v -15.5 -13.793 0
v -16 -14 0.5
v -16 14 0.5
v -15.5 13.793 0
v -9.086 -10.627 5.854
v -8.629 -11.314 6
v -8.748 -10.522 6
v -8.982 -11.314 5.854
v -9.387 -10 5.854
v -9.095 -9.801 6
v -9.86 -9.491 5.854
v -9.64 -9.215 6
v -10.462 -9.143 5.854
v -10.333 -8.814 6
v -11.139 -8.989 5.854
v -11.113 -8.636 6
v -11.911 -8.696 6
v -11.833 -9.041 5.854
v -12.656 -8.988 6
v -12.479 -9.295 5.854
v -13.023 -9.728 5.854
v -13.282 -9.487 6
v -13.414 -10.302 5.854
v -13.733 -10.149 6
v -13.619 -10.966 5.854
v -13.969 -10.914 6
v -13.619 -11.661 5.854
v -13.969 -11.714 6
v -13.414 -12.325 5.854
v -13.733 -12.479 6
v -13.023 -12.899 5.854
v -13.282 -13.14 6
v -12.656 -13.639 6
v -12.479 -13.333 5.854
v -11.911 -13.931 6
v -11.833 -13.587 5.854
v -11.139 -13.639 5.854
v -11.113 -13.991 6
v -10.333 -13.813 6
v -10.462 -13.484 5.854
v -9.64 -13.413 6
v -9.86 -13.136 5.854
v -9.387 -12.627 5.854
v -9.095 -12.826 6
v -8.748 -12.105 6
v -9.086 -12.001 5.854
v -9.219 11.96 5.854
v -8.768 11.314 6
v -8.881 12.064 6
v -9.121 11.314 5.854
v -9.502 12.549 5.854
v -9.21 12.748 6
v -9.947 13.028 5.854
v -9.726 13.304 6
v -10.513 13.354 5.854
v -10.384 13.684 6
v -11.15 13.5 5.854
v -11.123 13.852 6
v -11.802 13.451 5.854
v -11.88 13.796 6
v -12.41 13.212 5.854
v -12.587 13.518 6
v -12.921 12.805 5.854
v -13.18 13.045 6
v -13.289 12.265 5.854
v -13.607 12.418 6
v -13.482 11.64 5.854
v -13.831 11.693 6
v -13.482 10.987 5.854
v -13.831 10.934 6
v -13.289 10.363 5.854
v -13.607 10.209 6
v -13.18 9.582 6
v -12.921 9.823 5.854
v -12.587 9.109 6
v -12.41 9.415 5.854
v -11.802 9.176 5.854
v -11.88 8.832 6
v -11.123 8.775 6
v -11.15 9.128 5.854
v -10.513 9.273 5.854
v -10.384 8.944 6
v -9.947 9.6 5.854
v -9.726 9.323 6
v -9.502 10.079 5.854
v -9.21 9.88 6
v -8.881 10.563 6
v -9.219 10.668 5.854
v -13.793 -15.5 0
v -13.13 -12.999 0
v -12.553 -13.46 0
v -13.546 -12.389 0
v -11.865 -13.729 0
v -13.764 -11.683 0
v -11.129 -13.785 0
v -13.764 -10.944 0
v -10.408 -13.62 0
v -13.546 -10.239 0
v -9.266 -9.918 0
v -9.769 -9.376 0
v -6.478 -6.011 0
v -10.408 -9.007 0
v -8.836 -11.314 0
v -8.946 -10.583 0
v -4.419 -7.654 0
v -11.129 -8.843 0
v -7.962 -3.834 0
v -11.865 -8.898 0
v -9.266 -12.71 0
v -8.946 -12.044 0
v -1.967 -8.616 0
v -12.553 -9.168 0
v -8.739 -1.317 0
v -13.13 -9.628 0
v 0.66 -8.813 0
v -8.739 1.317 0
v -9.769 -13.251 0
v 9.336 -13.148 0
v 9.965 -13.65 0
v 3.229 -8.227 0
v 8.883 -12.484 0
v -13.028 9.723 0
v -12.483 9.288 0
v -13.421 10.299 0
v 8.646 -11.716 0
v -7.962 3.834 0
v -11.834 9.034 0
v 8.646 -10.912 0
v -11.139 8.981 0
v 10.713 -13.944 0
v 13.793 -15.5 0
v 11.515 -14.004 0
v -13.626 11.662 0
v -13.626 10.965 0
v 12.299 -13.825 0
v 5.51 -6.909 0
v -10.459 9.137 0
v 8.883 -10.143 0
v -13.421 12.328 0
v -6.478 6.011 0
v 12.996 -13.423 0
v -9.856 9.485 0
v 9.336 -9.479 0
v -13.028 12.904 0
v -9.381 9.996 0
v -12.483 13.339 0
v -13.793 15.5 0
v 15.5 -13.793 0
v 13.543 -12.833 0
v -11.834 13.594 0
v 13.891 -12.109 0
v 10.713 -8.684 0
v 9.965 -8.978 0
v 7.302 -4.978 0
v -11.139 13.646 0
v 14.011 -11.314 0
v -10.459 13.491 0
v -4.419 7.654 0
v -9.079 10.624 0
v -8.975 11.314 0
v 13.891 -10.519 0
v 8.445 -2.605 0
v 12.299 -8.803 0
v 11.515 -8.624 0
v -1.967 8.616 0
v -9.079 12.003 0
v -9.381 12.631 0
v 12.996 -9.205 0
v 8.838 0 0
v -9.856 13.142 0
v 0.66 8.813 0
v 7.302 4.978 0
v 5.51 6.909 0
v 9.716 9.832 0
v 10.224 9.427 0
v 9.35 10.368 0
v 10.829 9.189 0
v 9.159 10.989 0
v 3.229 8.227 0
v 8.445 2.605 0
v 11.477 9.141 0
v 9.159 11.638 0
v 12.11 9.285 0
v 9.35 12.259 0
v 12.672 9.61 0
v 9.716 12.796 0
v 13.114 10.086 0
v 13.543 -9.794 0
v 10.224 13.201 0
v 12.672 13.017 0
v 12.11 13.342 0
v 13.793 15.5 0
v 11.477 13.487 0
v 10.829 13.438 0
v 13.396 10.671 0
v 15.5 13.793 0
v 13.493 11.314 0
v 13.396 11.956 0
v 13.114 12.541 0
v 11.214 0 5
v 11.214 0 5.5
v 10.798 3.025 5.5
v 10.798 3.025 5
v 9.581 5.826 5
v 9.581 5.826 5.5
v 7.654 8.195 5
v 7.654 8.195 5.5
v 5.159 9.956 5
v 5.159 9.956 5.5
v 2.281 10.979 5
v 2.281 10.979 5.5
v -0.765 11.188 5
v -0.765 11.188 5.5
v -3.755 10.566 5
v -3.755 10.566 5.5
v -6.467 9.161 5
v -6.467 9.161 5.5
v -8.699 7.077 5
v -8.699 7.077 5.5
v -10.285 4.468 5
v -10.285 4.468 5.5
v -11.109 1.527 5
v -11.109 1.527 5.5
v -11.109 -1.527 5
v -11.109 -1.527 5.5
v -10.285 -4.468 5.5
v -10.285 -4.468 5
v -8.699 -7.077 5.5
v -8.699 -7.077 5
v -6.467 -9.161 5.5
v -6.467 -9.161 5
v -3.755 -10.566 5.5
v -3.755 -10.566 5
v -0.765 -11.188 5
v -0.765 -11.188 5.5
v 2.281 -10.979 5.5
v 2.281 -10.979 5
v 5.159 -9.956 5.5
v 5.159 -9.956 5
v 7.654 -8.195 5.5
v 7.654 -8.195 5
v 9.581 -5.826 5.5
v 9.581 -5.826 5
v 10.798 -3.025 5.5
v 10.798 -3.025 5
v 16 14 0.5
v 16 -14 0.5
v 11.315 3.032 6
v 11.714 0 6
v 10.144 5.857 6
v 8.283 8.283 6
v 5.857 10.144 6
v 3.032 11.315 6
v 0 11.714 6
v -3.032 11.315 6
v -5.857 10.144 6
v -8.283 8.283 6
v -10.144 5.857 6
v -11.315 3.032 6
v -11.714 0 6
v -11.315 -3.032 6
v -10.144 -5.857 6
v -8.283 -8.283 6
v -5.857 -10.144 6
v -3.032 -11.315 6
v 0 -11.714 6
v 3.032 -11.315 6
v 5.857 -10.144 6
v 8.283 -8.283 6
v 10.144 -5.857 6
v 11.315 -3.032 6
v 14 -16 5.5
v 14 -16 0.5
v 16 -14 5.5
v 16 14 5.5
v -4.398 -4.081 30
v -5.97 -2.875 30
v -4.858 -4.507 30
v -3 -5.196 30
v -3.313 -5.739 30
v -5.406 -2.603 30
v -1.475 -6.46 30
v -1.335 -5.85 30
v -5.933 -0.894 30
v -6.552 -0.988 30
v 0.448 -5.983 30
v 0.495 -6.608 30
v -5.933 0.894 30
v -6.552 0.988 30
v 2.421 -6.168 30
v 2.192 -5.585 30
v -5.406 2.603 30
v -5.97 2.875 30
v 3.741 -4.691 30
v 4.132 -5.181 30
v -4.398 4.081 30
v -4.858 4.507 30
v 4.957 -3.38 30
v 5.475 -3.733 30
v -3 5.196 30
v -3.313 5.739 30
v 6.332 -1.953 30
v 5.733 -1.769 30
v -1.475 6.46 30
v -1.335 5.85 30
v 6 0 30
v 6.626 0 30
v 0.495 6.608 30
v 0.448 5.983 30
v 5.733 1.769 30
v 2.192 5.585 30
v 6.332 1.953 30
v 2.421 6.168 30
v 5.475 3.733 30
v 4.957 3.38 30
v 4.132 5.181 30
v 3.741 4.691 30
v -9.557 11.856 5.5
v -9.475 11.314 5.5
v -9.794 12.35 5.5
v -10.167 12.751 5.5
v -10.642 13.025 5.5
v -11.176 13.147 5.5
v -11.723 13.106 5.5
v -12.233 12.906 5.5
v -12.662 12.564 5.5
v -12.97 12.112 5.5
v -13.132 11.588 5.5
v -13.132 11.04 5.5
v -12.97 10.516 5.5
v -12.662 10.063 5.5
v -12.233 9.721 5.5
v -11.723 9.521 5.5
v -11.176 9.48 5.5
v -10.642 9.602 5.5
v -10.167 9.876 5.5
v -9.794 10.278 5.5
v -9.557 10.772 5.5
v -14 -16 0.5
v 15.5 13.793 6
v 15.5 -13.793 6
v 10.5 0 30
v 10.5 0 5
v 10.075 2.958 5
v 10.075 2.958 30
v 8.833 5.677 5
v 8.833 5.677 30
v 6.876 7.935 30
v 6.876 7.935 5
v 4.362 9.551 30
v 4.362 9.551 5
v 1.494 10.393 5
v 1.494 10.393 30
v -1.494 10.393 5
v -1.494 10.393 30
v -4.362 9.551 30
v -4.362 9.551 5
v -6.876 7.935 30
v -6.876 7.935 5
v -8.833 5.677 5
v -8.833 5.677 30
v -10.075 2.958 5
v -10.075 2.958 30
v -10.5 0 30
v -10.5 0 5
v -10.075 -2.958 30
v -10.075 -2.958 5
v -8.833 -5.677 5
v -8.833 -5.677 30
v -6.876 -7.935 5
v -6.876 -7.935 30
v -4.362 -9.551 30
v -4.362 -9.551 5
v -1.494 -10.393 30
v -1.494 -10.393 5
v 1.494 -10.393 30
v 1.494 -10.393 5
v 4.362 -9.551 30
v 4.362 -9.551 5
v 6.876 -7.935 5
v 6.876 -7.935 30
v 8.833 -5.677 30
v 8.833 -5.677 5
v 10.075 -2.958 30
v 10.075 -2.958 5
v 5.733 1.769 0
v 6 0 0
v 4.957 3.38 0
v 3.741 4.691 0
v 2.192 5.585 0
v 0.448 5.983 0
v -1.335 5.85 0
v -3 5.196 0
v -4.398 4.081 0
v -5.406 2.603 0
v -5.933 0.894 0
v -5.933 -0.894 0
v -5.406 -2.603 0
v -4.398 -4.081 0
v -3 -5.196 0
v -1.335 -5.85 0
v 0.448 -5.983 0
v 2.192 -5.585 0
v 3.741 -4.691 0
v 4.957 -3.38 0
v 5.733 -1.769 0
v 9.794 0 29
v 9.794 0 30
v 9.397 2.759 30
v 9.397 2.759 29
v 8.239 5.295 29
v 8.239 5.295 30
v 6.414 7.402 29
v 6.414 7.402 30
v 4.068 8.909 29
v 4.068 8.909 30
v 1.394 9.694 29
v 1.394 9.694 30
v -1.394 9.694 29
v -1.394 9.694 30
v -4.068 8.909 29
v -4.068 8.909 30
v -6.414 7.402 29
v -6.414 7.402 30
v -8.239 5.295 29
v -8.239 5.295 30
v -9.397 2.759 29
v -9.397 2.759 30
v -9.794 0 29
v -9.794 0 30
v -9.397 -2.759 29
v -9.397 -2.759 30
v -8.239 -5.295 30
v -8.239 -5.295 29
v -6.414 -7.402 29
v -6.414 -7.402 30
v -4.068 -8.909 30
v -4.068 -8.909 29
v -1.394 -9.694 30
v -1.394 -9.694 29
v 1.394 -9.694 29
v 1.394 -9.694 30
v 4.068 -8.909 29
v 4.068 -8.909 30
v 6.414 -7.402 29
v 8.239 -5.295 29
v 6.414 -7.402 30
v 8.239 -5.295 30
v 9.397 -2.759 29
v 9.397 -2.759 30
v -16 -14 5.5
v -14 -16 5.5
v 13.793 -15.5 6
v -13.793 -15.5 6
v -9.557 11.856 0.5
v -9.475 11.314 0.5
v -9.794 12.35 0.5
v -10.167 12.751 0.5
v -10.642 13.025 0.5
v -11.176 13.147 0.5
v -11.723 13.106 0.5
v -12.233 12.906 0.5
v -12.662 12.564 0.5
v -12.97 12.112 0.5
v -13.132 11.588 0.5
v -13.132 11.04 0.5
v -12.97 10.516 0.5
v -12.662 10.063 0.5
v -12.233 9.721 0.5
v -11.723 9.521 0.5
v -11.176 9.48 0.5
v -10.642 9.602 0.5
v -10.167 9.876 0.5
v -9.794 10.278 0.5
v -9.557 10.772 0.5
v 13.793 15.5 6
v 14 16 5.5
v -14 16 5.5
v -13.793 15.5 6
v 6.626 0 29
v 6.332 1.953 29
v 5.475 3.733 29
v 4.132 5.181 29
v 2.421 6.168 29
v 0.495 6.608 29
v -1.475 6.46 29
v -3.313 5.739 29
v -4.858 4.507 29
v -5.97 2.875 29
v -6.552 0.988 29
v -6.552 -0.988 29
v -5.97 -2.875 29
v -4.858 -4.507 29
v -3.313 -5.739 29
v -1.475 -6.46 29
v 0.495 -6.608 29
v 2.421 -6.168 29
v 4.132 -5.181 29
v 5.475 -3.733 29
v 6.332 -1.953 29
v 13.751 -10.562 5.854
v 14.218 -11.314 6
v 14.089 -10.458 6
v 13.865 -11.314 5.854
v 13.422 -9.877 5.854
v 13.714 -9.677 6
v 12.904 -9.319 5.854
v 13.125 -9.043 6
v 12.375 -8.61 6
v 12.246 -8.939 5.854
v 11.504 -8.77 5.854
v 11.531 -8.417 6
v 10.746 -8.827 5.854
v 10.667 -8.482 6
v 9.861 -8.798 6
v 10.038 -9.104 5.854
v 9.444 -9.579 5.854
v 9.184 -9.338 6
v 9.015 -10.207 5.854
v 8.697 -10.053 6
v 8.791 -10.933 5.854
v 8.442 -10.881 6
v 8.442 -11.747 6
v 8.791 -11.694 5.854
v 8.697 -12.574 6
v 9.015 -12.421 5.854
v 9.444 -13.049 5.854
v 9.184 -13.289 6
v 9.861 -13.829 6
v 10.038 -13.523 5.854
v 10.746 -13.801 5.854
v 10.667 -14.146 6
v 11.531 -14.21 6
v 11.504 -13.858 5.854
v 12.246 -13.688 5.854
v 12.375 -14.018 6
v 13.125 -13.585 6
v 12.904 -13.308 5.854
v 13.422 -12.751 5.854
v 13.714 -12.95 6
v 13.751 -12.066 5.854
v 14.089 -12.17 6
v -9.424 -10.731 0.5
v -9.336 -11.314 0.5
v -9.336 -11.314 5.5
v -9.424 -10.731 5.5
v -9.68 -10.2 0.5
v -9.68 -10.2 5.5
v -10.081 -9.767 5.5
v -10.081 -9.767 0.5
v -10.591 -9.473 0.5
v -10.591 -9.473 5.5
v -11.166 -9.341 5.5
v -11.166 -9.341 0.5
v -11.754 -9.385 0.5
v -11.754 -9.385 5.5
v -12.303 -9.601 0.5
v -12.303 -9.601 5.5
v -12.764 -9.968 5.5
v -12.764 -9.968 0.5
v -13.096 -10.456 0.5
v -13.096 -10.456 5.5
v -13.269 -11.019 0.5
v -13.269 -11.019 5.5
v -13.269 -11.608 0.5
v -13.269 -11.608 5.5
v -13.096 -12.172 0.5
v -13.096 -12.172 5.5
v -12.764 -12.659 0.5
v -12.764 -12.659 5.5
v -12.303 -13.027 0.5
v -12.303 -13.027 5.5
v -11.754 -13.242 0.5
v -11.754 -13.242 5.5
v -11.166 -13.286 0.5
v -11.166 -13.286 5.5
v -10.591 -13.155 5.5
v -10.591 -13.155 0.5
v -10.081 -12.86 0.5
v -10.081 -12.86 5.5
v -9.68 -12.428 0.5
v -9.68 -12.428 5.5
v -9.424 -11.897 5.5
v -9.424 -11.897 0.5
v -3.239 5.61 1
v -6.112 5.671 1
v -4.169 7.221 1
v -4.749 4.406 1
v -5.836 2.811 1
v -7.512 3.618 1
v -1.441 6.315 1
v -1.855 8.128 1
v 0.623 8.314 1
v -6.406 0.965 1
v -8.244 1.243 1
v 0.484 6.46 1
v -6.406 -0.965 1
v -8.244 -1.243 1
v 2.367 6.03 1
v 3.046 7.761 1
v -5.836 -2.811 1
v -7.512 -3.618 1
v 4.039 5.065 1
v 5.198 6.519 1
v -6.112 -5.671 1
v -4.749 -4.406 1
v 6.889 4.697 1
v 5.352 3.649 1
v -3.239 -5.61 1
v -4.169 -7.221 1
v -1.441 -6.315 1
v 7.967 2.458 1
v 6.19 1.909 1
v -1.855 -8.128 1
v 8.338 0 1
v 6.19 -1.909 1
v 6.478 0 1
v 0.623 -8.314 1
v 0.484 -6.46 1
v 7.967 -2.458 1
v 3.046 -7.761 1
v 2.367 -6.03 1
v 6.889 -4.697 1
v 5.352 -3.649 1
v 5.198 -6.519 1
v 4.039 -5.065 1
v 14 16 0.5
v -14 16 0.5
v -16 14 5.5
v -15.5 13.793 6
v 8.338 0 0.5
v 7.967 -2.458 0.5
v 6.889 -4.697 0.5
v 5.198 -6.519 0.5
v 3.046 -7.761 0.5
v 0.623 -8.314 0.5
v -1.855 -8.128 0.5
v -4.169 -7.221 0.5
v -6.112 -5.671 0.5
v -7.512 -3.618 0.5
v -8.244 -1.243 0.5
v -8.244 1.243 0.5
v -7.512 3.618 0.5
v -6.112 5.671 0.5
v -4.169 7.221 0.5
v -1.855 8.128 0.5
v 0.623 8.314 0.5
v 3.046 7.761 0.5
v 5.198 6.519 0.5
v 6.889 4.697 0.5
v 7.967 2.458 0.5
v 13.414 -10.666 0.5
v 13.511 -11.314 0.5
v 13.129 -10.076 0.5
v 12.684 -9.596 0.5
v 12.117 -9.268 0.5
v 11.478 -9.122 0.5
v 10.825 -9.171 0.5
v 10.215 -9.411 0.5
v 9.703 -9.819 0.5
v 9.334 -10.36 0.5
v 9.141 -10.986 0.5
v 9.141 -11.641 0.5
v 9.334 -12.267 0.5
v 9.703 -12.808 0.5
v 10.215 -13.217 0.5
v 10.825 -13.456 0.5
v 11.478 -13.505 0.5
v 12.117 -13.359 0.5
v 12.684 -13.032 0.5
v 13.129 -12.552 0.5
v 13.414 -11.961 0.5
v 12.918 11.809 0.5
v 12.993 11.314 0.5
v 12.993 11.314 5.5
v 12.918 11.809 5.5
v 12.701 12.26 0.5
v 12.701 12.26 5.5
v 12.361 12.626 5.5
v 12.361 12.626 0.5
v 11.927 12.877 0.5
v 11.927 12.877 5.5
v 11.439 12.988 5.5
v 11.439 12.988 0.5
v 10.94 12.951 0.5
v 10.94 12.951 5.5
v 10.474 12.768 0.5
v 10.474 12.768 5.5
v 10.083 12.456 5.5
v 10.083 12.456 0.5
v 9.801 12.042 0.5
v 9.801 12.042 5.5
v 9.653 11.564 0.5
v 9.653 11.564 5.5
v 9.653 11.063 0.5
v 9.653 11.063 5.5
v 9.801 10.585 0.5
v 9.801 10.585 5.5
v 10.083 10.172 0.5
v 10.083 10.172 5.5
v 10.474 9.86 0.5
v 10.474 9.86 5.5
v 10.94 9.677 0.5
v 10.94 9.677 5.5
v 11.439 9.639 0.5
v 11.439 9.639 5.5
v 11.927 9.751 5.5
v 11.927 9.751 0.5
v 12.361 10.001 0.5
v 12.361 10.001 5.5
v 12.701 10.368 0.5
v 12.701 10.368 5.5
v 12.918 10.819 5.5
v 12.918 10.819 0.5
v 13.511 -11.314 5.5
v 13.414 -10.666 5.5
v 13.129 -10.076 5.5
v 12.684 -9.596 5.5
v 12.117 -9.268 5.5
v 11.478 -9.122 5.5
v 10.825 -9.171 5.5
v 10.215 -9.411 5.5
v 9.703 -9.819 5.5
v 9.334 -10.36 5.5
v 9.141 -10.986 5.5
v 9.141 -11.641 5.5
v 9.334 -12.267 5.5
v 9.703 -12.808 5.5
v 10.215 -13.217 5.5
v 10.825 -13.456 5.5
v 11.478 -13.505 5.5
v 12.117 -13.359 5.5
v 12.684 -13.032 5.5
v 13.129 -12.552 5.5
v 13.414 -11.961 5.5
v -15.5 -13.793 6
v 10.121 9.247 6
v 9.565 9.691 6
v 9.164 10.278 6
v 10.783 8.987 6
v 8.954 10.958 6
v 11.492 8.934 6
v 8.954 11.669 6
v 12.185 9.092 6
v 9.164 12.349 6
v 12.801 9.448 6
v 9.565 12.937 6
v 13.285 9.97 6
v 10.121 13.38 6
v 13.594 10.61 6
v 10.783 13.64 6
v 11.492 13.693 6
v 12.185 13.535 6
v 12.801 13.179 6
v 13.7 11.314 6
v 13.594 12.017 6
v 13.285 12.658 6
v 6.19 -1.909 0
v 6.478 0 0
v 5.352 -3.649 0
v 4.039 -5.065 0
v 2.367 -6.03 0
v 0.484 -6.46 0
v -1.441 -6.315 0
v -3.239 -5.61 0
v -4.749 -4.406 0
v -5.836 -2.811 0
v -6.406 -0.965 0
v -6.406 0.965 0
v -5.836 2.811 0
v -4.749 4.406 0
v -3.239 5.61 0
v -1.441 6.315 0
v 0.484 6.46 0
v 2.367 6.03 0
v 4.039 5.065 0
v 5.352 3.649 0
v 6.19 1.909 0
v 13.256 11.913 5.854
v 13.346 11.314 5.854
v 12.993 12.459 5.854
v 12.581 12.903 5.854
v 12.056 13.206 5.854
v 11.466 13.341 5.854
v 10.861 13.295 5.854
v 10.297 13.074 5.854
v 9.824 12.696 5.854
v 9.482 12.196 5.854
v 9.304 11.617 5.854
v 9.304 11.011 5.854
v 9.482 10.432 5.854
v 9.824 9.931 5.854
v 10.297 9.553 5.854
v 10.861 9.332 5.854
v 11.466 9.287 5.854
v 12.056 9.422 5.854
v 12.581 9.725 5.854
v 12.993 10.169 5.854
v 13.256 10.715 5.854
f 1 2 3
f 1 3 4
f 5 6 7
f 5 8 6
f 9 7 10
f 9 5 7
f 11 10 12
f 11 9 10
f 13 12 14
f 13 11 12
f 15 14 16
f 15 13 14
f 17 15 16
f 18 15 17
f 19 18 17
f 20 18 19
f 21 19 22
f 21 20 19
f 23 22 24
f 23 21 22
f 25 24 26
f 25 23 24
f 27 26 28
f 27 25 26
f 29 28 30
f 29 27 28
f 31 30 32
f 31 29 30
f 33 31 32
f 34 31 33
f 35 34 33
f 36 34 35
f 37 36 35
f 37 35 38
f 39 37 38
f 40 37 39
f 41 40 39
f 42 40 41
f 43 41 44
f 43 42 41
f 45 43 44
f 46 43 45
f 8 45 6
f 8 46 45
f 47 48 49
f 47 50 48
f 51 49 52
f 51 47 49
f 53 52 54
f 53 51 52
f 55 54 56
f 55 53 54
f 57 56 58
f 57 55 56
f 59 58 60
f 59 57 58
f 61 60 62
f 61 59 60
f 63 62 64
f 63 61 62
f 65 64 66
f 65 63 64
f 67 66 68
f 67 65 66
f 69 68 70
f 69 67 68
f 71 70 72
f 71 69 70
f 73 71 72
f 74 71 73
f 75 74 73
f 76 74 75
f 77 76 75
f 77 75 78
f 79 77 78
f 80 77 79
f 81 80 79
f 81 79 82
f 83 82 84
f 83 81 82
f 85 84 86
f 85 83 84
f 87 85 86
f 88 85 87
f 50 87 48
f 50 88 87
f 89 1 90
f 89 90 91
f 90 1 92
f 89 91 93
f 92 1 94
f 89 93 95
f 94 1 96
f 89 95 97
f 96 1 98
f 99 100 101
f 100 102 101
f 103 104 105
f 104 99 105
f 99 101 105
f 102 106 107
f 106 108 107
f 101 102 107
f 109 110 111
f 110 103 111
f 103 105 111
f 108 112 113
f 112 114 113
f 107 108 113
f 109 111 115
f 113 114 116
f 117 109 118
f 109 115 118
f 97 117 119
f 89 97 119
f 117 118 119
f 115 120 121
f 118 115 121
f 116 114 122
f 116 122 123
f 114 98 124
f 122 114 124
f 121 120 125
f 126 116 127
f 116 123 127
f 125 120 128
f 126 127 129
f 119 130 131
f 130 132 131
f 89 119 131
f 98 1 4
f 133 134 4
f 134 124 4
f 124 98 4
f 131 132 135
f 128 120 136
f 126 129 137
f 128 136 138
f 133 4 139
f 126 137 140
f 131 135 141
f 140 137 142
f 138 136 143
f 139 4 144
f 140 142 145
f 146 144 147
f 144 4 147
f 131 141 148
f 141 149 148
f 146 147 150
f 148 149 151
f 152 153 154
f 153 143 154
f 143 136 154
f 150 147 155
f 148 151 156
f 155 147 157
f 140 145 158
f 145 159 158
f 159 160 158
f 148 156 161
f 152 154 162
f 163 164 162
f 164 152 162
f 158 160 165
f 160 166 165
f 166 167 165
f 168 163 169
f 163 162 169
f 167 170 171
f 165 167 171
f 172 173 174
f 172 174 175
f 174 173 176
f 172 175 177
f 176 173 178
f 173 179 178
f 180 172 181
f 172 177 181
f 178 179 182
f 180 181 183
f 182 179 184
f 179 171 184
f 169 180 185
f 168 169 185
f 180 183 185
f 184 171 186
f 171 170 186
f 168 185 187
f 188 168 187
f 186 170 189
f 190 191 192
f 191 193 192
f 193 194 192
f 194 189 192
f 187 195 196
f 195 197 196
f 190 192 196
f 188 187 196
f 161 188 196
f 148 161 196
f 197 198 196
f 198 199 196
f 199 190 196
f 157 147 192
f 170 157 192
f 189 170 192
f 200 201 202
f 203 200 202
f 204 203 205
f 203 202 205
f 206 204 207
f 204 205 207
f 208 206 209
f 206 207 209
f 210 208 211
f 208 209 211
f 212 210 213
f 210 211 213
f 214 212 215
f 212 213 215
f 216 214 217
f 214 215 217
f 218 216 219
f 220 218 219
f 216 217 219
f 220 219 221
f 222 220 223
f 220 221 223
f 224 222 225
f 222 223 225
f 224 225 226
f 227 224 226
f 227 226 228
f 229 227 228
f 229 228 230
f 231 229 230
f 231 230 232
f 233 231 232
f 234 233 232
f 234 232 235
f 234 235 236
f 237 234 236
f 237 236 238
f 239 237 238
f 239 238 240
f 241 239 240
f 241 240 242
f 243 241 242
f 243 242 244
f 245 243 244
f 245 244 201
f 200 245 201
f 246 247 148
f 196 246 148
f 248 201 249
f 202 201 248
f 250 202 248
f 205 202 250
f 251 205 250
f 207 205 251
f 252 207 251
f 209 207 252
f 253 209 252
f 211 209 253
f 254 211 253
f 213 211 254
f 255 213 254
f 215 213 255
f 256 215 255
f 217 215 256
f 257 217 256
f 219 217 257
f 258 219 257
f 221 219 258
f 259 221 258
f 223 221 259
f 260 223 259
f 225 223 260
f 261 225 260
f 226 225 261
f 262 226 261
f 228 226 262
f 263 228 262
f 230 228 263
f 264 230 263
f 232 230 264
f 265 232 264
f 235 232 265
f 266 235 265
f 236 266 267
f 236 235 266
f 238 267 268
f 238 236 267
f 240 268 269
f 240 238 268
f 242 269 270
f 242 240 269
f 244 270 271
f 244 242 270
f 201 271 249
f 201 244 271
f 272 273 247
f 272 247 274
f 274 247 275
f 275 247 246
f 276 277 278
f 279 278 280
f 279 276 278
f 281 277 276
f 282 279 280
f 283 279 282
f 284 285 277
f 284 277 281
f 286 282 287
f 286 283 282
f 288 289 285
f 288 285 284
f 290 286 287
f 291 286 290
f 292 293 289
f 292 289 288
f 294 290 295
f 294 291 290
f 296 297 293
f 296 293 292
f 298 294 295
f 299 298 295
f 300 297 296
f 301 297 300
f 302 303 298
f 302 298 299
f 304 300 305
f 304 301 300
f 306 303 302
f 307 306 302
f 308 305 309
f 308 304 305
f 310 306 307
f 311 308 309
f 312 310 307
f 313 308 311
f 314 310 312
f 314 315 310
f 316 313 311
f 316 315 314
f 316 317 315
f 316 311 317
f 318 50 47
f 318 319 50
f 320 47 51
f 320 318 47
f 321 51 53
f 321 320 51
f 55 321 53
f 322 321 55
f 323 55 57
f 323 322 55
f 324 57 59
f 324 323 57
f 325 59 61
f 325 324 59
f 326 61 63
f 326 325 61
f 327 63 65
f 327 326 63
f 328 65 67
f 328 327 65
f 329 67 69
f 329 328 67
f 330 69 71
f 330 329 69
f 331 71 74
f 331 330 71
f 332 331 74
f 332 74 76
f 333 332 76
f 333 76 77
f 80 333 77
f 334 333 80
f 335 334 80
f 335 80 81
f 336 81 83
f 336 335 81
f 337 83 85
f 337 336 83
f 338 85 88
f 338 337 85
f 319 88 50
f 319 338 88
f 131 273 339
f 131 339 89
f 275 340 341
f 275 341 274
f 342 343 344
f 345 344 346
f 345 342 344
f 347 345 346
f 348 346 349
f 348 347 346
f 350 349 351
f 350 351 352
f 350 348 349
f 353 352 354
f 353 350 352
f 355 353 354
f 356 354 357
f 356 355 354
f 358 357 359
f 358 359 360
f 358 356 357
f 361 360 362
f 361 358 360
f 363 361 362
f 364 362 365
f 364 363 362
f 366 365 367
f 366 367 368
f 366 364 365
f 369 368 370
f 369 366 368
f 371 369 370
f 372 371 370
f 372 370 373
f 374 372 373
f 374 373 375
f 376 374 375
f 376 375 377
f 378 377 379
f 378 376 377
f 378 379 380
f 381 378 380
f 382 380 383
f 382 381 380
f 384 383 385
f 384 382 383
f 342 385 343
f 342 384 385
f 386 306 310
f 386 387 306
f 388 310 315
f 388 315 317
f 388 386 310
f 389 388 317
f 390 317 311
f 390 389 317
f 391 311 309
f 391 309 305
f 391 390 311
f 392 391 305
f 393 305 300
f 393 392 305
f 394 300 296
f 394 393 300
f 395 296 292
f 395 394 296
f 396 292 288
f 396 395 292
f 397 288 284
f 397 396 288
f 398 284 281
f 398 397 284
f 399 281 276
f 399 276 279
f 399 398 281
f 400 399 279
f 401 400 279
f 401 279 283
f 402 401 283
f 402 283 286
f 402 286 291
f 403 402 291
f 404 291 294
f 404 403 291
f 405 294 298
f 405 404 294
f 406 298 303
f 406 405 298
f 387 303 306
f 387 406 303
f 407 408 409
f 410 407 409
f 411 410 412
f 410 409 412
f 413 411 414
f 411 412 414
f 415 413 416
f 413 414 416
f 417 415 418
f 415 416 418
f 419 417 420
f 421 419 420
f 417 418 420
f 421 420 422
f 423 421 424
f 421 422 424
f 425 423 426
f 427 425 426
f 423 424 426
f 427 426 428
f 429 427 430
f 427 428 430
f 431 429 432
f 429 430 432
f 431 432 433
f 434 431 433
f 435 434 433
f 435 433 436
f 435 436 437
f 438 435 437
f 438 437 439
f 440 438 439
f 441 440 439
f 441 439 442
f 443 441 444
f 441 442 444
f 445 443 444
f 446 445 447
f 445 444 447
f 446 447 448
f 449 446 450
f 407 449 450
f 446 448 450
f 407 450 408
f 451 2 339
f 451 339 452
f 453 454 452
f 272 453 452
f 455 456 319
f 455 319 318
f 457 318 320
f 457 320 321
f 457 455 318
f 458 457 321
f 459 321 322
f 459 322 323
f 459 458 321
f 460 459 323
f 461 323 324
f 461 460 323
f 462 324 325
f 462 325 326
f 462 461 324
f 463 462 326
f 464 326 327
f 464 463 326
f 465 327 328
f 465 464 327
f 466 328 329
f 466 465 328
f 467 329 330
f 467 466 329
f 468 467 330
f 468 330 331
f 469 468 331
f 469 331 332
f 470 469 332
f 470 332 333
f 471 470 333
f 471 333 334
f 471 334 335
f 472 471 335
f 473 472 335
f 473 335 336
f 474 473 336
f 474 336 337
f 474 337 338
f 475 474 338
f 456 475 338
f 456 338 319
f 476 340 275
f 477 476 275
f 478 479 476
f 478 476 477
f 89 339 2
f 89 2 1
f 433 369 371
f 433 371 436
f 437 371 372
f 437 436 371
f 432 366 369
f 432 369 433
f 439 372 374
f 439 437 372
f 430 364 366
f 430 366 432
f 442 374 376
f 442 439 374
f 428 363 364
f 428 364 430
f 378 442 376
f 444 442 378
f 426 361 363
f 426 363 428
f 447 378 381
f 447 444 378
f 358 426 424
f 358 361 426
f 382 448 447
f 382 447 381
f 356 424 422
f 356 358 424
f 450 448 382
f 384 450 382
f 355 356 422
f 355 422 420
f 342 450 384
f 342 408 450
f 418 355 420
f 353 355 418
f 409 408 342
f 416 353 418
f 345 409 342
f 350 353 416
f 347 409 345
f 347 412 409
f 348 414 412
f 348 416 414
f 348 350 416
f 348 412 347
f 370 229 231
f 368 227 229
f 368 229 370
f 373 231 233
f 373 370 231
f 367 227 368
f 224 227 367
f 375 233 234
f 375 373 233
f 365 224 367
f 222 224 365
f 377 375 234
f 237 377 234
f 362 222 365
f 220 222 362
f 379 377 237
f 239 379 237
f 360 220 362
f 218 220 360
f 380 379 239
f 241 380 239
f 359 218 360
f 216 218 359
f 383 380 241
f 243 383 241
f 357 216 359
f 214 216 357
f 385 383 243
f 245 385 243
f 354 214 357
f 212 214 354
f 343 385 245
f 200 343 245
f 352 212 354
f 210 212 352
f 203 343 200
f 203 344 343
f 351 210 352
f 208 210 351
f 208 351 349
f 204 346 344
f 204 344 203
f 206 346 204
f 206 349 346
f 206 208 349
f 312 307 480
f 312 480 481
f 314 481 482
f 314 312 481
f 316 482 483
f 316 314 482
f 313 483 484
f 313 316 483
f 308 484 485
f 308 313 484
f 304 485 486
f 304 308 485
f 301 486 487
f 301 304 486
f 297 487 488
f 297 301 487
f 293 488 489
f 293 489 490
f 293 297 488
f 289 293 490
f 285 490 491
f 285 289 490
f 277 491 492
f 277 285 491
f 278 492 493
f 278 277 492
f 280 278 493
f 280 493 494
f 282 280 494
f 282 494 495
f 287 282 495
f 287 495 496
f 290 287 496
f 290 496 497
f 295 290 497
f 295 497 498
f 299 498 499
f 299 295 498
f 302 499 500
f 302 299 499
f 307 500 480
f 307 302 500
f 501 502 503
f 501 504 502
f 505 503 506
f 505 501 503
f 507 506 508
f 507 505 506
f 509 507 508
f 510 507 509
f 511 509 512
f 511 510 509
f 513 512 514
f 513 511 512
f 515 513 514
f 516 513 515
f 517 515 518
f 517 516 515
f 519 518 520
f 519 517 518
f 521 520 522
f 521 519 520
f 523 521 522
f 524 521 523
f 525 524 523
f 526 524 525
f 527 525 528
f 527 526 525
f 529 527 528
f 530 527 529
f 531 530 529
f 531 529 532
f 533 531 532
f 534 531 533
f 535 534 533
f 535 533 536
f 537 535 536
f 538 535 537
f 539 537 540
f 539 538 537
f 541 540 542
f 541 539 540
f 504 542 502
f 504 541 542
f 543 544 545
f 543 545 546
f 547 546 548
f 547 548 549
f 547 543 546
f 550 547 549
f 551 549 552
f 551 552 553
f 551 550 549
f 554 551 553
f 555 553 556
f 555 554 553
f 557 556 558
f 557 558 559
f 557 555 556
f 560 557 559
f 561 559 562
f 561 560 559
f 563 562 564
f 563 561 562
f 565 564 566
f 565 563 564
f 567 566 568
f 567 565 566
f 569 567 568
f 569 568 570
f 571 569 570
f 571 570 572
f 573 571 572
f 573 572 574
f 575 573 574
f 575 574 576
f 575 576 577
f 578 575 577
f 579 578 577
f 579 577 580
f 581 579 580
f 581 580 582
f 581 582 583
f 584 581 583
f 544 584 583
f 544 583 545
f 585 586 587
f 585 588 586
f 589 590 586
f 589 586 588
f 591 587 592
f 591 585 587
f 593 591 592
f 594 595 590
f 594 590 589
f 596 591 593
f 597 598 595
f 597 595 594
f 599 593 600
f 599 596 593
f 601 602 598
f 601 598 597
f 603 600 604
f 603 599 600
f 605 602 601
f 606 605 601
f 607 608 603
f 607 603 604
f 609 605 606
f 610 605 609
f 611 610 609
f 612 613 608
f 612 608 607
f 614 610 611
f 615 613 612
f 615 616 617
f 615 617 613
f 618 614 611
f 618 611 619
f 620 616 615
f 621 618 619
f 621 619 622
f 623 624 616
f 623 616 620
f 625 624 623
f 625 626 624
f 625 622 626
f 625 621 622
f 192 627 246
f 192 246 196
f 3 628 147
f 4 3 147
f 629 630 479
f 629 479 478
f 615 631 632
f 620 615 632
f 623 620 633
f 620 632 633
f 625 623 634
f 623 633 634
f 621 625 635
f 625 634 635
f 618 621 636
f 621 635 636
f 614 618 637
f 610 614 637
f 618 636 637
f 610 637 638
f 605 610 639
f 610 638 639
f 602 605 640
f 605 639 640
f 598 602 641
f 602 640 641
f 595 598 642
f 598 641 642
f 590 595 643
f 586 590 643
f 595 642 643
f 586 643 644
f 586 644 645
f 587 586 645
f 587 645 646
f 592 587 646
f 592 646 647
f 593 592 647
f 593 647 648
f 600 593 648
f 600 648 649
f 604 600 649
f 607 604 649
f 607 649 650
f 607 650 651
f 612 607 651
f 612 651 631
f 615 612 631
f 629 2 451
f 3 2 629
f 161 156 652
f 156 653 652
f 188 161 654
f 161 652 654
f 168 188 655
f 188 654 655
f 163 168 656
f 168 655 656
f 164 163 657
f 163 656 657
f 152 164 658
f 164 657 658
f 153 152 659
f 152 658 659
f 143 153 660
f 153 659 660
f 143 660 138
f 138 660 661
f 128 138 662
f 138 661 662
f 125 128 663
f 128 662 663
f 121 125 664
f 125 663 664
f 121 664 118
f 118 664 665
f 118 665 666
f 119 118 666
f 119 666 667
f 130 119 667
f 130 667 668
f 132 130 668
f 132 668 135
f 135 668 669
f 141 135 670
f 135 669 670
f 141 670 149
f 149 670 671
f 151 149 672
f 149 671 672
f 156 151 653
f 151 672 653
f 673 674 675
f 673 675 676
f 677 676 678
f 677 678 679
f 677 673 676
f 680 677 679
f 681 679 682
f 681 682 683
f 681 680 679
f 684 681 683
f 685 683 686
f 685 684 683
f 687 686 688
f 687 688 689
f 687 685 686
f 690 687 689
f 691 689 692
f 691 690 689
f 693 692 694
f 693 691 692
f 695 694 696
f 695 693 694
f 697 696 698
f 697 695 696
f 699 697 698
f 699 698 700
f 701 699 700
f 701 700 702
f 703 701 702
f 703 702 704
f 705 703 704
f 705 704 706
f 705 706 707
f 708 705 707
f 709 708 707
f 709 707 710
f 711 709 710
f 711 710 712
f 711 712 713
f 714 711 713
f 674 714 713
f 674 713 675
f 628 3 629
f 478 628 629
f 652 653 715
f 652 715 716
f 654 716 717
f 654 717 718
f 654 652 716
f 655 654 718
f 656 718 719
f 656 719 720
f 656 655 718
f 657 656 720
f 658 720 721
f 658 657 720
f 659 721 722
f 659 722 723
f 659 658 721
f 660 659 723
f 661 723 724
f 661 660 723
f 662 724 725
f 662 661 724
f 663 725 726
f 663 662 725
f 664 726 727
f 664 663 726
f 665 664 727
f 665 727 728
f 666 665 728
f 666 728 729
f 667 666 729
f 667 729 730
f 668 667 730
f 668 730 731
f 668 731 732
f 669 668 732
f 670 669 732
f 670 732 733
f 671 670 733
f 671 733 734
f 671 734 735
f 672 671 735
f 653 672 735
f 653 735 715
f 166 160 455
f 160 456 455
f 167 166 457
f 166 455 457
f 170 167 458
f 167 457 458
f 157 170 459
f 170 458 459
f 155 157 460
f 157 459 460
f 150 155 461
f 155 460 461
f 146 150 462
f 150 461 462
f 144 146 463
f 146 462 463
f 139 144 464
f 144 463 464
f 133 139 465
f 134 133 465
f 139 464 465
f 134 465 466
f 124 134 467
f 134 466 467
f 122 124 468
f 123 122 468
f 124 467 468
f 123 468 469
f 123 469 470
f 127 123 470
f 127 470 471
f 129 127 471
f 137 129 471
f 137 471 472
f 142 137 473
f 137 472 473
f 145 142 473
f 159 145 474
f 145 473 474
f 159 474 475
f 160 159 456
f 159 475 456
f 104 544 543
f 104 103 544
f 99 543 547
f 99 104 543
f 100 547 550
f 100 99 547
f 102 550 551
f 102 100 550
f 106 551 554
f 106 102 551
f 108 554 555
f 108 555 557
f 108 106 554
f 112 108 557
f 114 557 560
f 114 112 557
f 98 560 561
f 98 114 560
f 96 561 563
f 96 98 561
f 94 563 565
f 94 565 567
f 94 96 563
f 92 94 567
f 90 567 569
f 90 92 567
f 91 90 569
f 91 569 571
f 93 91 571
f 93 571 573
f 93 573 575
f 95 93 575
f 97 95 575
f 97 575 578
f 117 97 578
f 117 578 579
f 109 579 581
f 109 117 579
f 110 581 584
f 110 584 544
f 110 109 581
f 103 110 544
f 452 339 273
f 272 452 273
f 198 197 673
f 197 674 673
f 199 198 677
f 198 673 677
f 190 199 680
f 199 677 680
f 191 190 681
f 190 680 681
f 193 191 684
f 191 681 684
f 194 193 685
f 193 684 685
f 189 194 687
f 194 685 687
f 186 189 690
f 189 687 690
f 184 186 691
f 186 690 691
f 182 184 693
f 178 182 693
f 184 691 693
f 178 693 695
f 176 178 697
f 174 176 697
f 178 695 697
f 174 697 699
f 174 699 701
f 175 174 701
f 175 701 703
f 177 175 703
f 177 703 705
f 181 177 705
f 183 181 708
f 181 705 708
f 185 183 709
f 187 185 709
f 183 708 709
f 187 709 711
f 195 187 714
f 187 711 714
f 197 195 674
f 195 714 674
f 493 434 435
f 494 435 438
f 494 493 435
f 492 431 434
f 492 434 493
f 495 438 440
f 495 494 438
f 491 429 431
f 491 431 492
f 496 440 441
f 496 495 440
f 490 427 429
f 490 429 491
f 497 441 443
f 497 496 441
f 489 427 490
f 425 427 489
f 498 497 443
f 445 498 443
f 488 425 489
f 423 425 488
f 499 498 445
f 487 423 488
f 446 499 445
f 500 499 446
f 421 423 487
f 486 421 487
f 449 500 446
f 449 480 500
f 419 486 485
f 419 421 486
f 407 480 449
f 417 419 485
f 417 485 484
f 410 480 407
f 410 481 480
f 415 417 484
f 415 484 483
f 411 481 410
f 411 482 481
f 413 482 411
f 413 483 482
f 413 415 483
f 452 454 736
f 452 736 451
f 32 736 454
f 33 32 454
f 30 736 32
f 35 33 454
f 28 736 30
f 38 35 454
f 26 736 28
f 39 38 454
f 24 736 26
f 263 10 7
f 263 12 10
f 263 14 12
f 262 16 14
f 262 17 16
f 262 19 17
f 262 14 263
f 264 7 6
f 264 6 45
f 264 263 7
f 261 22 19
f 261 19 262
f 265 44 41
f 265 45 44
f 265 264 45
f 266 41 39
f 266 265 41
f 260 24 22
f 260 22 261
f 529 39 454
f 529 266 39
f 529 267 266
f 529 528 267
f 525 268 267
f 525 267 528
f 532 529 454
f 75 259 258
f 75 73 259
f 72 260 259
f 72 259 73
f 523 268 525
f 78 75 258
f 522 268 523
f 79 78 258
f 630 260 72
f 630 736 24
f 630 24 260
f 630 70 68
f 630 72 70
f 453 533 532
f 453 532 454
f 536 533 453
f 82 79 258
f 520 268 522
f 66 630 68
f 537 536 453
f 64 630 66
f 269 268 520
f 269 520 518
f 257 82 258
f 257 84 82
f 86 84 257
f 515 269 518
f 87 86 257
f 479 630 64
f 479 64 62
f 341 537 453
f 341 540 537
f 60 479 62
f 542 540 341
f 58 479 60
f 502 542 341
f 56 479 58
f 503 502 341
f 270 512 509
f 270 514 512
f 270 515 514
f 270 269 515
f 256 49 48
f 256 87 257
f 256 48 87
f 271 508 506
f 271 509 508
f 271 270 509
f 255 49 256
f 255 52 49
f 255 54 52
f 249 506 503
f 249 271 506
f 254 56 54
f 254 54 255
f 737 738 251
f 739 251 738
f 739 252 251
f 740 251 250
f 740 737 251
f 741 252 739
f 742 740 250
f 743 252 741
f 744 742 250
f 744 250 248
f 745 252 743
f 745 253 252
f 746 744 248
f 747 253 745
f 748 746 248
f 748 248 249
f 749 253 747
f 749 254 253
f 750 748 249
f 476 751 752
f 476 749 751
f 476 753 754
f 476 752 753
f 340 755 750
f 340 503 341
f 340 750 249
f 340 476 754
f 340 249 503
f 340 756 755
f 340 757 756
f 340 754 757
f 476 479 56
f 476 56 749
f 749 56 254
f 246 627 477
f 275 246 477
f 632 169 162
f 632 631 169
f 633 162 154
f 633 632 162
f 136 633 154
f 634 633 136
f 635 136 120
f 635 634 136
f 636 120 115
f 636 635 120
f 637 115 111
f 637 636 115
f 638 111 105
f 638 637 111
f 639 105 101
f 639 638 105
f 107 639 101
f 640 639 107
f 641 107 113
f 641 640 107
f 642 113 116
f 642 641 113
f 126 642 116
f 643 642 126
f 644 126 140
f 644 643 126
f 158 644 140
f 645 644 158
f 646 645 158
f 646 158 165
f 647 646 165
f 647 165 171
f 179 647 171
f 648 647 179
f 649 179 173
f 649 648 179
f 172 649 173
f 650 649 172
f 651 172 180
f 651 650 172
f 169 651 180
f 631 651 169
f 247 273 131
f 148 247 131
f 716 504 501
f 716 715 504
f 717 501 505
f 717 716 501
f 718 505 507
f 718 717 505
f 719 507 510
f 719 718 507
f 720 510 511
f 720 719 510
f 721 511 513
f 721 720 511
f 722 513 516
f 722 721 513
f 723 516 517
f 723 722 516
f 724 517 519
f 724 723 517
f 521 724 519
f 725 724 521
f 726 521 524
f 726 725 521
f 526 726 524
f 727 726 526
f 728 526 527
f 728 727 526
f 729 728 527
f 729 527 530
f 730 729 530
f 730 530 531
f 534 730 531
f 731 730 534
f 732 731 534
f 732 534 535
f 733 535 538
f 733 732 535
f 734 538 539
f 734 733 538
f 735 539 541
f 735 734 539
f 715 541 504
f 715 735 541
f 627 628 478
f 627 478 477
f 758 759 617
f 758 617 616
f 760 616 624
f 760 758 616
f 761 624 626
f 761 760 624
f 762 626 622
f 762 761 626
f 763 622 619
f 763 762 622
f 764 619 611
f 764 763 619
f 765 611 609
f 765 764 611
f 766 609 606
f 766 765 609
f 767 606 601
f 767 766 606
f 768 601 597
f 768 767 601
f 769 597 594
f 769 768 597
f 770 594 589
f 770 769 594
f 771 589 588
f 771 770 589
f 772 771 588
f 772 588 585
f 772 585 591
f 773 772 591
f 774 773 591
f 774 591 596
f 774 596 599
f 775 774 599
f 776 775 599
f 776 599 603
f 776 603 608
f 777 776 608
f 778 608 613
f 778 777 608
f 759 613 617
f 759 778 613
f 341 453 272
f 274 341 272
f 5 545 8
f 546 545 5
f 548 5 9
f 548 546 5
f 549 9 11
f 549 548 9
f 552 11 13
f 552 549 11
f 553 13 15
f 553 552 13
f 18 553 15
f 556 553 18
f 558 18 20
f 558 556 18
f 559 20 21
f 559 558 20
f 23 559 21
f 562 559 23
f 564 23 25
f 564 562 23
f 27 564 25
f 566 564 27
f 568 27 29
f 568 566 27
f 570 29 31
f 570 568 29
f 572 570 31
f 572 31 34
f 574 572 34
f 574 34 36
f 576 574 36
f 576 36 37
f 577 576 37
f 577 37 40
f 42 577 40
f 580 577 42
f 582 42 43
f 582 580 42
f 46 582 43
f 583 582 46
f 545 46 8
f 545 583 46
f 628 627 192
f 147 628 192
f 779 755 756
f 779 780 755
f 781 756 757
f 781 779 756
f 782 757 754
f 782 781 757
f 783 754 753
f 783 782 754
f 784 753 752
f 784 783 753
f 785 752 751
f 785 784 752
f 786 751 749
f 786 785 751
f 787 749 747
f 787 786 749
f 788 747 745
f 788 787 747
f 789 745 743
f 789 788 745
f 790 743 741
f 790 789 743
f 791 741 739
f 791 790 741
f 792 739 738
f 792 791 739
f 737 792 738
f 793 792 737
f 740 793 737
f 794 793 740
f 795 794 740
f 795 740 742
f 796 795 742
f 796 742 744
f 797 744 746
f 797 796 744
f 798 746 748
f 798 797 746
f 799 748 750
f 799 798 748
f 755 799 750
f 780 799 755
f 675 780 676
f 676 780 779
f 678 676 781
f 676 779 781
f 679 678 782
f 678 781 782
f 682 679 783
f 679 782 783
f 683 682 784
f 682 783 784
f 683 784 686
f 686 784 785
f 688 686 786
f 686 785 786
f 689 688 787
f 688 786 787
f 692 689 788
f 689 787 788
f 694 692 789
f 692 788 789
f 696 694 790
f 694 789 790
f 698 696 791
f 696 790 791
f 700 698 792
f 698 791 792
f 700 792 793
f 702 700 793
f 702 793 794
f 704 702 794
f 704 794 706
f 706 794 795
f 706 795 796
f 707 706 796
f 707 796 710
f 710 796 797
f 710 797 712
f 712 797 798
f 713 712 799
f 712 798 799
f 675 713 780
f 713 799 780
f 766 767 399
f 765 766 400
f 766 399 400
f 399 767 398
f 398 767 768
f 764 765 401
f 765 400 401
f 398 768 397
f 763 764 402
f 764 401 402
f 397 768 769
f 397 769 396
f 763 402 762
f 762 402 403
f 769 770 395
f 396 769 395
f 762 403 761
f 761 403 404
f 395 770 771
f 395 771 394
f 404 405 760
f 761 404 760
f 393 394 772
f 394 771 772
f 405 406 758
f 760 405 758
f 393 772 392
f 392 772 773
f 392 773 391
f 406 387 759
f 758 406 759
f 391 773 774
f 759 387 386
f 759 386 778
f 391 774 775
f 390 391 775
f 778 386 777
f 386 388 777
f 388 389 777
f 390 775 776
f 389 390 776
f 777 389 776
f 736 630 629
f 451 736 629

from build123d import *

# Parameters (mm, degrees)
F0_W          = 32
F0_H          = 32
F0_R          = 1.9778790134
F0_R_2        = 2.1975244048
F0_R_3        = 1.8387533056
F0_R_4        = 6
F0_R_5        = 1.6790844608
F1_DEPTH      = 6
F2_R          = 10.5
F2_R_2        = 6
F3_DEPTH      = 24
F4_SIZE       = 2
F5_R          = 11.2136661157
F5_R_2        = 10.5
F6_DEPTH      = 1
F7_R          = 9.7938073019
F7_R_2        = 6.6264369037
F8_DEPTH      = 1
F9_SIZE       = 0.5
F10_R         = 8.3375339565
F10_R_2       = 6.4778965527
F11_DEPTH     = 1
F12_T1_DEPTH  = 30.571682988
F12_T3_DEPTH  = 5.4001101127
F12_T5_DEPTH  = 5.4001101127
F12_T7_DEPTH  = 30.571682988
F12_T9_DEPTH  = 5.4001101127
F12_T11_DEPTH = 5.4001101127


# Not quite as in the source:
# - a fillet or chamfer that OpenCascade refuses, or shapes differently, is made with other operations: its cross-section is extruded or revolved along the edge and cut away or added


with BuildPart() as f1:
    # F0 (on Top) → F1 (new body)
    with BuildSketch(Plane.XY):
        Rectangle(F0_W, F0_H)
        with Locations((-11.313708499, -11.313708499)):
            Circle(F0_R, mode=Mode.SUBTRACT)
        with Locations((11.313708499, -11.313708499)):
            Circle(F0_R_2, mode=Mode.SUBTRACT)
        with Locations((-11.313708499, 11.313708499)):
            Circle(F0_R_3, mode=Mode.SUBTRACT)
        Circle(F0_R_4, mode=Mode.SUBTRACT)
        with Locations((11.313708499, 11.313708499)):
            Circle(F0_R_5, mode=Mode.SUBTRACT)
    extrude(amount=F1_DEPTH)

    # F2 (on face) → F3 (join)
    with BuildSketch(Plane.XY.offset(6)):
        Circle(F2_R)
        Circle(F2_R_2, mode=Mode.SUBTRACT)
    extrude(amount=F3_DEPTH)

    # F4
    f4_edges = [f1.edges().sort_by_distance(p)[0] for p in [
        (-16, -16, 3),
        (16, -16, 3),
        (-16, 16, 3),
        (16, 16, 3),
    ]]
    chamfer(f4_edges, length=F4_SIZE)

    # F5 (on face) → F6 (cut)
    with BuildSketch(Plane.XY.offset(6)):
        Circle(F5_R)
        Circle(F5_R_2, mode=Mode.SUBTRACT)
    extrude(amount=-F6_DEPTH, mode=Mode.SUBTRACT)

    # F7 (on face) → F8 (cut)
    with BuildSketch(Plane.XY.offset(30)):
        Circle(F7_R)
        Circle(F7_R_2, mode=Mode.SUBTRACT)
    extrude(amount=-F8_DEPTH, mode=Mode.SUBTRACT)

    # F9
    f9_edges = [f1.edges().sort_by_distance(p)[0] for p in [
        (-13.291588, -11.313708, 6),
        (9.634624, 11.313708, 6),
        (9.116184, -11.313708, 6),
        (-13.152462, 11.313708, 6),
    ]]
    chamfer(f9_edges, length=F9_SIZE)

    # F10 (on face) → F11 (cut)
    with BuildSketch(Plane(origin=(0, 0, 0), x_dir=(1, 0, 0), z_dir=(0, 0, -1))):
        Circle(F10_R)
        Circle(F10_R_2, mode=Mode.SUBTRACT)
    extrude(amount=-F11_DEPTH, mode=Mode.SUBTRACT)

    # F12: chamfer of 0.5 on 26 edges, made by hand

    # F12_s2 → F12_t1 (cut)
    with BuildSketch(Plane.YZ.offset(-15.285841494)):
        Polygon((-16, 0.5), (-15.5, 0), (-16, 0), align=None)
        Polygon((16, 0.5), (15.5, 0), (16, 0), align=None)
        Polygon((-15.5, 6), (-16, 5.5), (-16, 6), align=None)
        Polygon((15.5, 6), (16, 5.5), (16, 6), align=None)
    extrude(amount=F12_T1_DEPTH, mode=Mode.SUBTRACT)

    # F12_s4 → F12_t3 (cut)
    with BuildSketch(Plane(origin=(1.9092272399, -1.9092272399, 0), x_dir=(0, 0, 1), z_dir=(-0.7071067812, 0.7071067812, 0))):
        Polygon((0.5, -21.2132034356), (0, -20.7132034356), (0, -21.2132034356), align=None)
        Polygon((6, -20.7132034356), (5.5, -21.2132034356), (6, -21.2132034356), align=None)
    extrude(amount=F12_T3_DEPTH, mode=Mode.SUBTRACT)

    # F12_s6 → F12_t5 (cut)
    with BuildSketch(Plane(origin=(-1.9092272399, -1.9092272399, 0), x_dir=(0, 0, 1), z_dir=(0.7071067812, 0.7071067812, 0))):
        Polygon((0.5, 21.2132034356), (0, 20.7132034356), (0, 21.2132034356), align=None)
        Polygon((6, 20.7132034356), (5.5, 21.2132034356), (6, 21.2132034356), align=None)
    extrude(amount=F12_T5_DEPTH, mode=Mode.SUBTRACT)

    # F12_s8 → F12_t7 (cut)
    with BuildSketch(Plane.XZ.offset(-15.285841494)):
        Polygon((-16, 0.5), (-15.5, 0), (-16, 0), align=None)
        Polygon((16, 0.5), (15.5, 0), (16, 0), align=None)
        Polygon((-15.5, 6), (-16, 5.5), (-16, 6), align=None)
        Polygon((15.5, 6), (16, 5.5), (16, 6), align=None)
    extrude(amount=F12_T7_DEPTH, mode=Mode.SUBTRACT)

    # F12_s10 → F12_t9 (cut)
    with BuildSketch(Plane(origin=(1.9092272399, 1.9092272399, 0), x_dir=(0, 0, 1), z_dir=(-0.7071067812, -0.7071067812, 0))):
        Polygon((0.5, 21.2132034356), (0, 20.7132034356), (0, 21.2132034356), align=None)
        Polygon((6, 20.7132034356), (5.5, 21.2132034356), (6, 21.2132034356), align=None)
    extrude(amount=F12_T9_DEPTH, mode=Mode.SUBTRACT)

    # F12_s12 → F12_t11 (cut)
    with BuildSketch(Plane(origin=(-1.9092272399, 1.9092272399, 0), x_dir=(0, 0, 1), z_dir=(0.7071067812, -0.7071067812, 0))):
        Polygon((0.5, -21.2132034356), (0, -20.7132034356), (0, -21.2132034356), align=None)
        Polygon((6, -20.7132034356), (5.5, -21.2132034356), (6, -21.2132034356), align=None)
    extrude(amount=F12_T11_DEPTH, mode=Mode.SUBTRACT)

    # F12_s13 → F12_t14 (revolve, cut)
    with BuildSketch(Plane.XZ.offset(11.313708499)):
        Polygon((-9.3358294856, 0.5), (-8.8358294856, 0), (-9.3358294856, 0), align=None)
    revolve(axis=Axis((-11.313708499, -11.313708499, 0), (0, 0, 1)), mode=Mode.SUBTRACT)

    # F12_s15 → F12_t16 (revolve, cut)
    with BuildSketch(Plane.XZ.offset(11.313708499)):
        Polygon((14.0112329038, 0), (13.5112329038, 0.5), (13.5112329038, 0), align=None)
    revolve(axis=Axis((11.313708499, -11.313708499, 0), (0, 0, 1)), mode=Mode.SUBTRACT)

    # F12_s17 → F12_t18 (revolve, cut)
    with BuildSketch(Plane.XZ):
        Polygon((8.8375339565, 0), (8.3375339565, 0.5), (8.3375339565, 0), align=None)
    revolve(axis=Axis((0, 0, 0), (0, 0, -1)), mode=Mode.SUBTRACT)

    # F12_s19 → F12_t20 (revolve, cut)
    with BuildSketch(Plane.XZ.offset(-11.313708499)):
        Polygon((-8.9749551934, 0), (-9.4749551934, 0.5), (-9.4749551934, 0), align=None)
    revolve(axis=Axis((-11.313708499, 11.313708499, 0), (0, 0, 1)), mode=Mode.SUBTRACT)

    # F12_s21 → F12_t22 (revolve, cut)
    with BuildSketch(Plane.XZ.offset(-11.313708499)):
        Polygon((13.4927929597, 0), (12.9927929597, 0.5), (12.9927929597, 0), align=None)
    revolve(axis=Axis((11.313708499, 11.313708499, 0), (0, 0, 1)), mode=Mode.SUBTRACT)

    # F12_s23 → F12_t24 (revolve, cut)
    with BuildSketch(Plane.XZ.offset(11.313708499)):
        Polygon((-8.6287227044, 6), (-8.982276095, 5.8535533906), (-8.8358294856, 6), align=None)
    revolve(axis=Axis((-11.313708499, -11.313708499, 6), (0, 0, 1)), mode=Mode.SUBTRACT)

    # F12_s25 → F12_t26 (revolve, cut)
    with BuildSketch(Plane.XZ):
        Polygon((11.7136661157, 6), (11.2136661157, 5.5), (11.2136661157, 6), align=None)
    revolve(axis=Axis((0, 0, 6), (0, 0, 1)), mode=Mode.SUBTRACT)

    # F12_s27 → F12_t28 (revolve, cut)
    with BuildSketch(Plane.XZ.offset(-11.313708499)):
        Polygon((13.6998997409, 6), (13.3463463503, 5.8535533906), (13.4927929597, 6), align=None)
    revolve(axis=Axis((11.313708499, 11.313708499, 6), (0, 0, 1)), mode=Mode.SUBTRACT)

    # F12_s29 → F12_t30 (revolve, cut)
    with BuildSketch(Plane.XZ.offset(11.313708499)):
        Polygon((14.218339685, 6), (13.8647862944, 5.8535533906), (14.0112329038, 6), align=None)
    revolve(axis=Axis((11.313708499, -11.313708499, 6), (0, 0, 1)), mode=Mode.SUBTRACT)

    # F12_s31 → F12_t32 (revolve, cut)
    with BuildSketch(Plane.XZ.offset(-11.313708499)):
        Polygon((-8.7678484122, 6), (-9.1214018028, 5.8535533906), (-8.9749551934, 6), align=None)
    revolve(axis=Axis((-11.313708499, 11.313708499, 6), (0, 0, 1)), mode=Mode.SUBTRACT)


solid = f1.part
